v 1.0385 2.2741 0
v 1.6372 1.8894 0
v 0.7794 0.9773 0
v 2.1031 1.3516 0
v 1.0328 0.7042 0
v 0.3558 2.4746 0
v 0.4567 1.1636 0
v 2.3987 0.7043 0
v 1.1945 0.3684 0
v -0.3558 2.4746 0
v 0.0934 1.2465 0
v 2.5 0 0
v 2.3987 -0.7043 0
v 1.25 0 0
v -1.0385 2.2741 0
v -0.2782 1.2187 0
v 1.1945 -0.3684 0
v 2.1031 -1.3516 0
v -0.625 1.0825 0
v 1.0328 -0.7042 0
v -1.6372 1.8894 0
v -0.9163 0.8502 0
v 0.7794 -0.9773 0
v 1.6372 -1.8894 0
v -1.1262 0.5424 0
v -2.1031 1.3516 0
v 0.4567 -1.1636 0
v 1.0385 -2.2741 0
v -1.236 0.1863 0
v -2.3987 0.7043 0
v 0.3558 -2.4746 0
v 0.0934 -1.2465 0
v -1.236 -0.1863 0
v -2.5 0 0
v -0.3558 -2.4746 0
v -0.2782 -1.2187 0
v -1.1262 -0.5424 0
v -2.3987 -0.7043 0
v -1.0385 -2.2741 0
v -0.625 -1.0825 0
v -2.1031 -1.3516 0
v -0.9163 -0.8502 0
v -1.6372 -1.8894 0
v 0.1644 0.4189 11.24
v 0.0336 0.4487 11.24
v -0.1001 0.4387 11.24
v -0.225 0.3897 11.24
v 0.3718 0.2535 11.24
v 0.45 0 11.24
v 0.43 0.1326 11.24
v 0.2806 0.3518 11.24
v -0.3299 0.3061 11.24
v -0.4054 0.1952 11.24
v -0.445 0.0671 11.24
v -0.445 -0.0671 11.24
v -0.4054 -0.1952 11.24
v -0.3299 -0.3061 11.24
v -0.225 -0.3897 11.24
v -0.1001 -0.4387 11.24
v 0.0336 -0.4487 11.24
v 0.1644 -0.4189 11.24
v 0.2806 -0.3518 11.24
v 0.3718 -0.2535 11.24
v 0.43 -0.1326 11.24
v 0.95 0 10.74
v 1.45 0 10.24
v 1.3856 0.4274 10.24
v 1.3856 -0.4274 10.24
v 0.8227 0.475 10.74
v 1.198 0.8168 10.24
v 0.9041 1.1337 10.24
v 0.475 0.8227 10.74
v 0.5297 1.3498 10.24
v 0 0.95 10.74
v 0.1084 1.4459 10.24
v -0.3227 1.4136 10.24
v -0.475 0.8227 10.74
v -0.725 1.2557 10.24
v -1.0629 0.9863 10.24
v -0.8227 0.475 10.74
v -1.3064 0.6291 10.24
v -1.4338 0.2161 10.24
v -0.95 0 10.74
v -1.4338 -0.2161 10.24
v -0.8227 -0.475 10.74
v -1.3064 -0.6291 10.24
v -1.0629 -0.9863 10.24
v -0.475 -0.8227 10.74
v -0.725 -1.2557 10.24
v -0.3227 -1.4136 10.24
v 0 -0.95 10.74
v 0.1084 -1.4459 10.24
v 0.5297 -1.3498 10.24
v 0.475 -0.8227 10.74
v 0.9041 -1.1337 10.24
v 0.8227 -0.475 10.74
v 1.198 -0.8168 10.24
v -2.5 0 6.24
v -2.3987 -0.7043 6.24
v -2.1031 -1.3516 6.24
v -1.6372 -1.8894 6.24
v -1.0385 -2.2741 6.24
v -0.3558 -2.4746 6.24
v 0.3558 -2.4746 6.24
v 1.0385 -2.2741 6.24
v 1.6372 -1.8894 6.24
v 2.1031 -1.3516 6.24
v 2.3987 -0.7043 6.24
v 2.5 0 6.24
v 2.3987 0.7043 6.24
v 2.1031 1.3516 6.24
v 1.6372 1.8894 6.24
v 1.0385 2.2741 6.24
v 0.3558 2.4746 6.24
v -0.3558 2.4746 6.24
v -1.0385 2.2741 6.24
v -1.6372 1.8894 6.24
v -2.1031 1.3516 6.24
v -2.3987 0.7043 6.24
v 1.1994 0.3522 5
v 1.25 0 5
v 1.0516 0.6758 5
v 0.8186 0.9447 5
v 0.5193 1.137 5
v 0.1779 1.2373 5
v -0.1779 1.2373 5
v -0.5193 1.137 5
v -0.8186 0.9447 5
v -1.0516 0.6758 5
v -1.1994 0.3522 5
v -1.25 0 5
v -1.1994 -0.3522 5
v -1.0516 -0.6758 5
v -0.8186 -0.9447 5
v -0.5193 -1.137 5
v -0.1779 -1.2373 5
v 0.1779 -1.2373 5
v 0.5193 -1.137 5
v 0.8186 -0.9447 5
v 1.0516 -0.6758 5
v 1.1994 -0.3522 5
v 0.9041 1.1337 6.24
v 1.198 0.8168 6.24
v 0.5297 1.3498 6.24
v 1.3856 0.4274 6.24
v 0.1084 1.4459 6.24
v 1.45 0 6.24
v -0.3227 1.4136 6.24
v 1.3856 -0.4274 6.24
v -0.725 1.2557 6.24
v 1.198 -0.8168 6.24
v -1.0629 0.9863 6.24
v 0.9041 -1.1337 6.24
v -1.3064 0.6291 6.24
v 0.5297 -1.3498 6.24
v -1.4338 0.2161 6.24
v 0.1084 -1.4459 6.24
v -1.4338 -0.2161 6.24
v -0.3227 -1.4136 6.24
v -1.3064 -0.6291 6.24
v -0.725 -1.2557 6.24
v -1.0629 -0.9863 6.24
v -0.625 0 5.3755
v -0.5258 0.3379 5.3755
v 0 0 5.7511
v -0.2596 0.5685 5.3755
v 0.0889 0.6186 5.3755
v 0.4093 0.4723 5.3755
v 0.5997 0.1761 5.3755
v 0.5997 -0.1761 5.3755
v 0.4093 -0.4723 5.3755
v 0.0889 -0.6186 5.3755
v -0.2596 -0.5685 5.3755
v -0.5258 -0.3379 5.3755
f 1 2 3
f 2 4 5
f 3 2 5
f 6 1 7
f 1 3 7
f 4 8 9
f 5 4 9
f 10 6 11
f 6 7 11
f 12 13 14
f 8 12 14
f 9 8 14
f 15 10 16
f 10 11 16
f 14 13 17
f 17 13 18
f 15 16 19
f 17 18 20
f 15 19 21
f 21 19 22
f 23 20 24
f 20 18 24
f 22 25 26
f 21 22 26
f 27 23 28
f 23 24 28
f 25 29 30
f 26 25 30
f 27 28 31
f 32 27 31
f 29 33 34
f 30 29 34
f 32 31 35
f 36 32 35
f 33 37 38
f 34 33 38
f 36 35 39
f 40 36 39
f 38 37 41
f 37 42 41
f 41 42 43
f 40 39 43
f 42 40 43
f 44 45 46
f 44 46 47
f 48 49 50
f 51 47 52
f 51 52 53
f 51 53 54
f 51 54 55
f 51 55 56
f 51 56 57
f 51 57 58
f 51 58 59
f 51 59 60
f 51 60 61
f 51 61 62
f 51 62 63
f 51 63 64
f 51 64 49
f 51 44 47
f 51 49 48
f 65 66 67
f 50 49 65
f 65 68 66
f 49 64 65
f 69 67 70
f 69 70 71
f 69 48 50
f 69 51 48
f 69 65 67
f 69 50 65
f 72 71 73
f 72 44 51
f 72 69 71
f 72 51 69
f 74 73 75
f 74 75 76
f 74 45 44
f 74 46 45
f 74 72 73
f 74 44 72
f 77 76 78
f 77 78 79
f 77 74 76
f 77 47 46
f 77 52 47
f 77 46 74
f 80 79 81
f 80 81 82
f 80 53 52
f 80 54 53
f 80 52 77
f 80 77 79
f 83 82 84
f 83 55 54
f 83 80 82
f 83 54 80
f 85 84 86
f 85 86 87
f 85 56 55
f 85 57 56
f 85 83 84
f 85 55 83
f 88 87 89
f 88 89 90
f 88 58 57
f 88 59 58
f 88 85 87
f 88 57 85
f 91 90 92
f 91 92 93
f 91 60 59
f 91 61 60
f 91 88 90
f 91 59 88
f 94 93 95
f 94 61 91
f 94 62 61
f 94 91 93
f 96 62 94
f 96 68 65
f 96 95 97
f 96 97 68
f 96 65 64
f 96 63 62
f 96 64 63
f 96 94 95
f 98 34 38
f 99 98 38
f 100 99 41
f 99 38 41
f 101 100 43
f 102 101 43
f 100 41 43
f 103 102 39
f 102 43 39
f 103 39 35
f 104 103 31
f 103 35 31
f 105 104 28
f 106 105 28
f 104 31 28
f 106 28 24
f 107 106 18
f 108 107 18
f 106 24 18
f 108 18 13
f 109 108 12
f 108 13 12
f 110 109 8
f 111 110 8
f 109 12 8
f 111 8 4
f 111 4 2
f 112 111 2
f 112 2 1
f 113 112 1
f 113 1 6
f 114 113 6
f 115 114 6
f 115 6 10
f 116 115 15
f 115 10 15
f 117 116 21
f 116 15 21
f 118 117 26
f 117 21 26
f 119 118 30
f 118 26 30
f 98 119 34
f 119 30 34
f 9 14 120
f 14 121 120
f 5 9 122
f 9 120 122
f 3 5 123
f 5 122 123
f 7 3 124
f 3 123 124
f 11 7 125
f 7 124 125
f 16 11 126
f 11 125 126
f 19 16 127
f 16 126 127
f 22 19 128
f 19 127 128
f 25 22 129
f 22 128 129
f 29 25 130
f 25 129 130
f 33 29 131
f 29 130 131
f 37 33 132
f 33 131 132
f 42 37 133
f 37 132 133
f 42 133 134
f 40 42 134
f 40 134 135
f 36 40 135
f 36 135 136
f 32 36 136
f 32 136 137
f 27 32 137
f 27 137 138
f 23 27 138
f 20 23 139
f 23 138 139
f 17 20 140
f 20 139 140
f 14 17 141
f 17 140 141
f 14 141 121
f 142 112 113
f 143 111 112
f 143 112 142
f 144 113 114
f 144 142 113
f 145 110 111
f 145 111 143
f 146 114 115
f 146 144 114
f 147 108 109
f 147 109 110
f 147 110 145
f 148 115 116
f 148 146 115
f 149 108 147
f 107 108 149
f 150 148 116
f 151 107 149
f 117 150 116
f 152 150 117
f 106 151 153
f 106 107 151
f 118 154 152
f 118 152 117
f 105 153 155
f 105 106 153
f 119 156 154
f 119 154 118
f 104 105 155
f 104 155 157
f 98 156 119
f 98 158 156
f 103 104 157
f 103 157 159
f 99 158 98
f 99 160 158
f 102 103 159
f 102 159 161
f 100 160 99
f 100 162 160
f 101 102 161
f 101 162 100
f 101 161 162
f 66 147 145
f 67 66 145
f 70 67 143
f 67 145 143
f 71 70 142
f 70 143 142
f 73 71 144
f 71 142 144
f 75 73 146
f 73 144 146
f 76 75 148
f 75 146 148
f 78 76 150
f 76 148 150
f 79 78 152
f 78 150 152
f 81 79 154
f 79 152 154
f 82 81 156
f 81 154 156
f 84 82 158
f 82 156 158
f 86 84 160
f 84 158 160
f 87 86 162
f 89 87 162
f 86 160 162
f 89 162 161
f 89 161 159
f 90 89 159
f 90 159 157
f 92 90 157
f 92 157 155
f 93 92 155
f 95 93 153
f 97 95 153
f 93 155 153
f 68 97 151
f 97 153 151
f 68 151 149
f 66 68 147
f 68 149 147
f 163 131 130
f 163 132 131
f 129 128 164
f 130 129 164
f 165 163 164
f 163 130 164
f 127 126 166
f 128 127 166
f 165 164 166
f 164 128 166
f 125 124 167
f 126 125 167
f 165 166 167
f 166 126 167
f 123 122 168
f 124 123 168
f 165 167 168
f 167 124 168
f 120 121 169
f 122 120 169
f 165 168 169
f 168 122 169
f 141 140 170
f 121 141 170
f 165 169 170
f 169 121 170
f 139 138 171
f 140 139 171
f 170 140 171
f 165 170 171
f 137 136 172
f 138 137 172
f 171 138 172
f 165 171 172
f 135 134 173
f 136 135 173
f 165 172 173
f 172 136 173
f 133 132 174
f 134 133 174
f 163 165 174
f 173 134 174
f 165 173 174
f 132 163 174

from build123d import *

# Parameters (mm, degrees)
SKETCH_1_R      = 2.5
EXTRUDE_1_DEPTH = 6.24
SKETCH_2_R      = 1.45
EXTRUDE_2_DEPTH = 5
M3X0_51_D       = 2.5
M3X0_51_DEPTH   = 5
M3X0_51_TIP     = 0.751075774
CHAMFER_1_SIZE  = 1


with BuildPart() as part:
    # Эскиз1 → Бобышка-Вытянуть1 (new body)
    with BuildSketch(Plane.XY):
        with Locations(Location((0, 0, 0), (0, 0, 180))):
            Circle(SKETCH_1_R)
    extrude(amount=EXTRUDE_1_DEPTH)

    # Эскиз2 → Бобышка-Вытянуть2 (add)
    with BuildSketch(Plane.XY.offset(6.24)):
        Circle(SKETCH_2_R)
    extrude(amount=EXTRUDE_2_DEPTH)

    # Отверстие обработанное метчиком M3x0.51
    with Locations(Plane(origin=(0, 0, 0), x_dir=(-1, 0, 0), z_dir=(0, 0, -1))):
        with Locations((0, 0)):
            Hole(M3X0_51_D / 2, depth=M3X0_51_DEPTH)
            with Locations((0, 0, -(M3X0_51_DEPTH + M3X0_51_TIP / 2))):  # 118° drill point
                Cone(0, M3X0_51_D / 2, M3X0_51_TIP, mode=Mode.SUBTRACT)

    # Фаска1
    chamfer_1_edges = [part.edges().sort_by_distance(p)[0] for p in [
        (-1.45, 0, 11.24),
    ]]
    chamfer(chamfer_1_edges, length=CHAMFER_1_SIZE)


solid = part.part
